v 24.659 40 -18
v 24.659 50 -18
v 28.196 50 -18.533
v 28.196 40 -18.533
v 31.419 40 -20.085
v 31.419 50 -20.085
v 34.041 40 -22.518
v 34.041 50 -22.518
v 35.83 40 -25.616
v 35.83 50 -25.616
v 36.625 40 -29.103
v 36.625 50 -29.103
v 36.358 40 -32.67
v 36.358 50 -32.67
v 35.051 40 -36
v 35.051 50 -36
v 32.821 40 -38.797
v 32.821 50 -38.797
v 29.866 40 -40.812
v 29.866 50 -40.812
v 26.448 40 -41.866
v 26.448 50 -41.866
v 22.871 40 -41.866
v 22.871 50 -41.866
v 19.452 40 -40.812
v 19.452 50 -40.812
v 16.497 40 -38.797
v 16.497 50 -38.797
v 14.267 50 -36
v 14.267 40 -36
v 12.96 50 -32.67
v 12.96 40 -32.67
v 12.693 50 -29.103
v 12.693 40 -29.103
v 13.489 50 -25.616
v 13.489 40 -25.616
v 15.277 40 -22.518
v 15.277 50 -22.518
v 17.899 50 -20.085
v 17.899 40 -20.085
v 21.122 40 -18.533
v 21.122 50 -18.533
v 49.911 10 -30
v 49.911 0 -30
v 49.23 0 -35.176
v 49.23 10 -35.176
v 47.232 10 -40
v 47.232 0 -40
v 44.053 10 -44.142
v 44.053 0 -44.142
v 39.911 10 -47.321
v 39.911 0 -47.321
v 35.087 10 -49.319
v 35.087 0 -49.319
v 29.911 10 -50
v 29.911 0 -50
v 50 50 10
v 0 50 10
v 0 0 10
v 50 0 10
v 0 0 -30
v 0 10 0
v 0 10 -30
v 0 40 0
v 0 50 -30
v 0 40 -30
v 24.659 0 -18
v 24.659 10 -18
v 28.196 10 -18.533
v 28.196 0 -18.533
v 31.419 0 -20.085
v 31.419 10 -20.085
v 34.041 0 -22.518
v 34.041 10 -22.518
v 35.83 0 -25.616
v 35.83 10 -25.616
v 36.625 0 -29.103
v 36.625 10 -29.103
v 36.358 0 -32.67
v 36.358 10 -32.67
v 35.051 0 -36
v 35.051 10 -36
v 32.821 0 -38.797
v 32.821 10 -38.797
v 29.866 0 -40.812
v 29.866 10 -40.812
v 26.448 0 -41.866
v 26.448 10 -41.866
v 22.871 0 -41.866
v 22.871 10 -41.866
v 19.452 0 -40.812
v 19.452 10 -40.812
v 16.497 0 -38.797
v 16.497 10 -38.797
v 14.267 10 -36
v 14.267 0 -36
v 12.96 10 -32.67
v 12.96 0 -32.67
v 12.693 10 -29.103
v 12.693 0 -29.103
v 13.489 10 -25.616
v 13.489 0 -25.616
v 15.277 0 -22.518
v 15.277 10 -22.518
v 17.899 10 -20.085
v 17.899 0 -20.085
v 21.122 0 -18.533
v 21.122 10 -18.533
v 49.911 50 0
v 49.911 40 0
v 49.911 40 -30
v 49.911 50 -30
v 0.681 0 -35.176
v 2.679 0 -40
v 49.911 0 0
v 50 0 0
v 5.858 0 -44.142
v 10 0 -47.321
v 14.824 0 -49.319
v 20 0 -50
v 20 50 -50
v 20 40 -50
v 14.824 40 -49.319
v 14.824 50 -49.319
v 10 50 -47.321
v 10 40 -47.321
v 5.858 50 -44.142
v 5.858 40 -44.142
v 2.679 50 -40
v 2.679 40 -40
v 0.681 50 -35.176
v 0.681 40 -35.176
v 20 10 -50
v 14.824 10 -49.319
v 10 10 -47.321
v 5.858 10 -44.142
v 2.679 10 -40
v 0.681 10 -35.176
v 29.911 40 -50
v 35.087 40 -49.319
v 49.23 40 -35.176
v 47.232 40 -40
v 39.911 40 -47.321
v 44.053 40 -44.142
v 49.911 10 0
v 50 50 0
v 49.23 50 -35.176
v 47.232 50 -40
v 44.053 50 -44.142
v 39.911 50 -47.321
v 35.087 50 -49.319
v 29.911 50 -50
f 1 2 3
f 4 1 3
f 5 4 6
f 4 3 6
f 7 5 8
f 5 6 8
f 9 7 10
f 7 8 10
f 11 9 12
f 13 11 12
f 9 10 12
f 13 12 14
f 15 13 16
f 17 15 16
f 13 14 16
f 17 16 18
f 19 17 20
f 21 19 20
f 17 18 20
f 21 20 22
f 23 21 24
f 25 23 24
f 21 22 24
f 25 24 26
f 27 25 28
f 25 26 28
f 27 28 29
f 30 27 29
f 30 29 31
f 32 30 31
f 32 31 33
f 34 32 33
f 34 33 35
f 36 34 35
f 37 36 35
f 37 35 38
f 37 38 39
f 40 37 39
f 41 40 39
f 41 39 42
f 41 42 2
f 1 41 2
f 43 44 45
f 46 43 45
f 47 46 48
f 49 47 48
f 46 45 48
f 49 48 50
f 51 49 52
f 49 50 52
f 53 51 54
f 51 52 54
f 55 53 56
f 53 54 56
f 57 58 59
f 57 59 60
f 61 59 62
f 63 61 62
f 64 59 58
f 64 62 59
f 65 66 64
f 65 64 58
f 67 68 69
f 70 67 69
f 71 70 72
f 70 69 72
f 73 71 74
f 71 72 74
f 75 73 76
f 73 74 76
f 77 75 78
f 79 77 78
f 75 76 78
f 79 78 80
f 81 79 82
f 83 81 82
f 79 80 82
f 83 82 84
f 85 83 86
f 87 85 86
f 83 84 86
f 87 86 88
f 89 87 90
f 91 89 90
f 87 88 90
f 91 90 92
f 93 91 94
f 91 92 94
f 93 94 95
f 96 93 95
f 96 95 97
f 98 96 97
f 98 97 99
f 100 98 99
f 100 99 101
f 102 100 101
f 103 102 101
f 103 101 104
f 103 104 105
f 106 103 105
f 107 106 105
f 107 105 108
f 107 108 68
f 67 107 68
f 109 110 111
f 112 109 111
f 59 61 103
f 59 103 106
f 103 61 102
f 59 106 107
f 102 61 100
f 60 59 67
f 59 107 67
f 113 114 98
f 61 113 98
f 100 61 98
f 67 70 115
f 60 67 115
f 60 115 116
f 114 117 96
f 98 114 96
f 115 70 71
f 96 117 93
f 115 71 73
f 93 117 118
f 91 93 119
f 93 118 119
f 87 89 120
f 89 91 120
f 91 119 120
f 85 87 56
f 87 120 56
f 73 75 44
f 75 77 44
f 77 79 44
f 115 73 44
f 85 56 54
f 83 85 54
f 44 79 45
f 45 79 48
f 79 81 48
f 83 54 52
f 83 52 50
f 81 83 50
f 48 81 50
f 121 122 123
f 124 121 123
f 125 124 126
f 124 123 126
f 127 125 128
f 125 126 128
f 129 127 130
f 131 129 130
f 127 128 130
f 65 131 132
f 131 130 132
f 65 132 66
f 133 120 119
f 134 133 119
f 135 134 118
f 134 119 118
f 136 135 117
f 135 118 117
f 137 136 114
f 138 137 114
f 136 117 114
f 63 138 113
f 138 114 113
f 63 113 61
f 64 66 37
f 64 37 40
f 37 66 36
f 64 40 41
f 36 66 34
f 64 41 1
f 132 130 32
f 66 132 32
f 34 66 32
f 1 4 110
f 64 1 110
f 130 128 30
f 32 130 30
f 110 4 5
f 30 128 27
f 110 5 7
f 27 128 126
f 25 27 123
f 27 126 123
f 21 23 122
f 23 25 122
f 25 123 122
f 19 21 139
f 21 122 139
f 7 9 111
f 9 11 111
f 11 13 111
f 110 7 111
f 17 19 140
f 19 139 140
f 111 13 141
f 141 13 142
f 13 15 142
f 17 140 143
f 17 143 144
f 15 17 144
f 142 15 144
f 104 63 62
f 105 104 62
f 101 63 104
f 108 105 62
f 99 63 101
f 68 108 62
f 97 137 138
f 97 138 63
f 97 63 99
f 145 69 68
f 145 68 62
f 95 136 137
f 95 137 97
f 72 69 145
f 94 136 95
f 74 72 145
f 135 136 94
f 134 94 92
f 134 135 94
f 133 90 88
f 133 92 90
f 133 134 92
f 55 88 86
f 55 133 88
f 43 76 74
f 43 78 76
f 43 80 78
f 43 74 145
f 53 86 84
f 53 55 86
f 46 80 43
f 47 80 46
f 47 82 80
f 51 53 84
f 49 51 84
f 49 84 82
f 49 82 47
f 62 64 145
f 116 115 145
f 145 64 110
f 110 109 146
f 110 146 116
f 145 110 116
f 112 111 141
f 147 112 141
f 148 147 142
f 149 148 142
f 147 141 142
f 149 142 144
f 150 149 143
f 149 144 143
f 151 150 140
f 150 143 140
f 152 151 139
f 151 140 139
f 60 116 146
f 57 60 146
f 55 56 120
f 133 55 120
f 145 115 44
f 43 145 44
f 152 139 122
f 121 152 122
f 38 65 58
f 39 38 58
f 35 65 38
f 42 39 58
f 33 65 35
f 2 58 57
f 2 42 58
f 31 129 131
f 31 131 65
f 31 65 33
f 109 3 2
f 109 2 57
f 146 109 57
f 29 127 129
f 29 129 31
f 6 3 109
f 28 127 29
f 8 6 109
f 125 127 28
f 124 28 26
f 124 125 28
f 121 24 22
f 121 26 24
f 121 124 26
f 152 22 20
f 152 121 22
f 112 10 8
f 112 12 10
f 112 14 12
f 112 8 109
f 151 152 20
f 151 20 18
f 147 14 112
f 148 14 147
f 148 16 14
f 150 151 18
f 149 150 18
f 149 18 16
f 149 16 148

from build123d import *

# Parameters (mm, degrees)
SKETCH1_W           = 50
SKETCH1_H           = 50
BOSS_EXTRUDE1_DEPTH = 10
BOSS_EXTRUDE2_DEPTH = 10
BOSS_EXTRUDE3_START = -10
BOSS_EXTRUDE3_DEPTH = 10
SKETCH4_R           = 12
CUT_EXTRUDE2_DEPTH  = 120


with BuildPart() as part:
    # Sketch1 → Boss-Extrude1 (new body)
    with BuildSketch(Plane.XY):
        with Locations((25, 25)):
            Rectangle(SKETCH1_W, SKETCH1_H)
    extrude(amount=BOSS_EXTRUDE1_DEPTH)

    # Sketch2 → Boss-Extrude2 (add)
    with BuildSketch(Plane(origin=(0, 0, 0), x_dir=(1, 0, 0), z_dir=(0, 1, 0))):
        with BuildLine():
            Line((0, 0), (49.911002168, 0))
            Line((49.911002168, 0), (49.911002168, 30))
            ThreePointArc((49.911002168, 30), (44.053137792, 44.142135624), (29.911002168, 50))
            Line((29.911002168, 50), (20, 50))
            ThreePointArc((20, 50), (5.857864376, 44.142135624), (0, 30))
            Line((0, 30), (0, 0))
        make_face()
    extrude(amount=BOSS_EXTRUDE2_DEPTH)

    # Sketch3 → Boss-Extrude3 (add)
    with BuildSketch(Plane(origin=(0, 50, 0), x_dir=(1, 0, 0), z_dir=(0, 1, 0)).offset(BOSS_EXTRUDE3_START)):
        with BuildLine():
            Line((0, 0), (49.911002168, 0))
            Line((49.911002168, 0), (49.911002168, 30))
            ThreePointArc((49.911002168, 30), (44.053137792, 44.142135624), (29.911002168, 50))
            Line((29.911002168, 50), (20, 50))
            ThreePointArc((20, 50), (5.857864376, 44.142135624), (0, 30))
            Line((0, 30), (0, 0))
        make_face()
    extrude(amount=BOSS_EXTRUDE3_DEPTH)

    # Sketch4 → Cut-Extrude2 (cut)
    with BuildSketch(Plane(origin=(0, 50, 0), x_dir=(1, 0, 0), z_dir=(0, 1, 0))):
        with Locations(Location((24.659042371, 30, 0), (0, 0, 270))):
            Circle(SKETCH4_R)
    extrude(amount=-CUT_EXTRUDE2_DEPTH, mode=Mode.SUBTRACT)


solid = part.part
